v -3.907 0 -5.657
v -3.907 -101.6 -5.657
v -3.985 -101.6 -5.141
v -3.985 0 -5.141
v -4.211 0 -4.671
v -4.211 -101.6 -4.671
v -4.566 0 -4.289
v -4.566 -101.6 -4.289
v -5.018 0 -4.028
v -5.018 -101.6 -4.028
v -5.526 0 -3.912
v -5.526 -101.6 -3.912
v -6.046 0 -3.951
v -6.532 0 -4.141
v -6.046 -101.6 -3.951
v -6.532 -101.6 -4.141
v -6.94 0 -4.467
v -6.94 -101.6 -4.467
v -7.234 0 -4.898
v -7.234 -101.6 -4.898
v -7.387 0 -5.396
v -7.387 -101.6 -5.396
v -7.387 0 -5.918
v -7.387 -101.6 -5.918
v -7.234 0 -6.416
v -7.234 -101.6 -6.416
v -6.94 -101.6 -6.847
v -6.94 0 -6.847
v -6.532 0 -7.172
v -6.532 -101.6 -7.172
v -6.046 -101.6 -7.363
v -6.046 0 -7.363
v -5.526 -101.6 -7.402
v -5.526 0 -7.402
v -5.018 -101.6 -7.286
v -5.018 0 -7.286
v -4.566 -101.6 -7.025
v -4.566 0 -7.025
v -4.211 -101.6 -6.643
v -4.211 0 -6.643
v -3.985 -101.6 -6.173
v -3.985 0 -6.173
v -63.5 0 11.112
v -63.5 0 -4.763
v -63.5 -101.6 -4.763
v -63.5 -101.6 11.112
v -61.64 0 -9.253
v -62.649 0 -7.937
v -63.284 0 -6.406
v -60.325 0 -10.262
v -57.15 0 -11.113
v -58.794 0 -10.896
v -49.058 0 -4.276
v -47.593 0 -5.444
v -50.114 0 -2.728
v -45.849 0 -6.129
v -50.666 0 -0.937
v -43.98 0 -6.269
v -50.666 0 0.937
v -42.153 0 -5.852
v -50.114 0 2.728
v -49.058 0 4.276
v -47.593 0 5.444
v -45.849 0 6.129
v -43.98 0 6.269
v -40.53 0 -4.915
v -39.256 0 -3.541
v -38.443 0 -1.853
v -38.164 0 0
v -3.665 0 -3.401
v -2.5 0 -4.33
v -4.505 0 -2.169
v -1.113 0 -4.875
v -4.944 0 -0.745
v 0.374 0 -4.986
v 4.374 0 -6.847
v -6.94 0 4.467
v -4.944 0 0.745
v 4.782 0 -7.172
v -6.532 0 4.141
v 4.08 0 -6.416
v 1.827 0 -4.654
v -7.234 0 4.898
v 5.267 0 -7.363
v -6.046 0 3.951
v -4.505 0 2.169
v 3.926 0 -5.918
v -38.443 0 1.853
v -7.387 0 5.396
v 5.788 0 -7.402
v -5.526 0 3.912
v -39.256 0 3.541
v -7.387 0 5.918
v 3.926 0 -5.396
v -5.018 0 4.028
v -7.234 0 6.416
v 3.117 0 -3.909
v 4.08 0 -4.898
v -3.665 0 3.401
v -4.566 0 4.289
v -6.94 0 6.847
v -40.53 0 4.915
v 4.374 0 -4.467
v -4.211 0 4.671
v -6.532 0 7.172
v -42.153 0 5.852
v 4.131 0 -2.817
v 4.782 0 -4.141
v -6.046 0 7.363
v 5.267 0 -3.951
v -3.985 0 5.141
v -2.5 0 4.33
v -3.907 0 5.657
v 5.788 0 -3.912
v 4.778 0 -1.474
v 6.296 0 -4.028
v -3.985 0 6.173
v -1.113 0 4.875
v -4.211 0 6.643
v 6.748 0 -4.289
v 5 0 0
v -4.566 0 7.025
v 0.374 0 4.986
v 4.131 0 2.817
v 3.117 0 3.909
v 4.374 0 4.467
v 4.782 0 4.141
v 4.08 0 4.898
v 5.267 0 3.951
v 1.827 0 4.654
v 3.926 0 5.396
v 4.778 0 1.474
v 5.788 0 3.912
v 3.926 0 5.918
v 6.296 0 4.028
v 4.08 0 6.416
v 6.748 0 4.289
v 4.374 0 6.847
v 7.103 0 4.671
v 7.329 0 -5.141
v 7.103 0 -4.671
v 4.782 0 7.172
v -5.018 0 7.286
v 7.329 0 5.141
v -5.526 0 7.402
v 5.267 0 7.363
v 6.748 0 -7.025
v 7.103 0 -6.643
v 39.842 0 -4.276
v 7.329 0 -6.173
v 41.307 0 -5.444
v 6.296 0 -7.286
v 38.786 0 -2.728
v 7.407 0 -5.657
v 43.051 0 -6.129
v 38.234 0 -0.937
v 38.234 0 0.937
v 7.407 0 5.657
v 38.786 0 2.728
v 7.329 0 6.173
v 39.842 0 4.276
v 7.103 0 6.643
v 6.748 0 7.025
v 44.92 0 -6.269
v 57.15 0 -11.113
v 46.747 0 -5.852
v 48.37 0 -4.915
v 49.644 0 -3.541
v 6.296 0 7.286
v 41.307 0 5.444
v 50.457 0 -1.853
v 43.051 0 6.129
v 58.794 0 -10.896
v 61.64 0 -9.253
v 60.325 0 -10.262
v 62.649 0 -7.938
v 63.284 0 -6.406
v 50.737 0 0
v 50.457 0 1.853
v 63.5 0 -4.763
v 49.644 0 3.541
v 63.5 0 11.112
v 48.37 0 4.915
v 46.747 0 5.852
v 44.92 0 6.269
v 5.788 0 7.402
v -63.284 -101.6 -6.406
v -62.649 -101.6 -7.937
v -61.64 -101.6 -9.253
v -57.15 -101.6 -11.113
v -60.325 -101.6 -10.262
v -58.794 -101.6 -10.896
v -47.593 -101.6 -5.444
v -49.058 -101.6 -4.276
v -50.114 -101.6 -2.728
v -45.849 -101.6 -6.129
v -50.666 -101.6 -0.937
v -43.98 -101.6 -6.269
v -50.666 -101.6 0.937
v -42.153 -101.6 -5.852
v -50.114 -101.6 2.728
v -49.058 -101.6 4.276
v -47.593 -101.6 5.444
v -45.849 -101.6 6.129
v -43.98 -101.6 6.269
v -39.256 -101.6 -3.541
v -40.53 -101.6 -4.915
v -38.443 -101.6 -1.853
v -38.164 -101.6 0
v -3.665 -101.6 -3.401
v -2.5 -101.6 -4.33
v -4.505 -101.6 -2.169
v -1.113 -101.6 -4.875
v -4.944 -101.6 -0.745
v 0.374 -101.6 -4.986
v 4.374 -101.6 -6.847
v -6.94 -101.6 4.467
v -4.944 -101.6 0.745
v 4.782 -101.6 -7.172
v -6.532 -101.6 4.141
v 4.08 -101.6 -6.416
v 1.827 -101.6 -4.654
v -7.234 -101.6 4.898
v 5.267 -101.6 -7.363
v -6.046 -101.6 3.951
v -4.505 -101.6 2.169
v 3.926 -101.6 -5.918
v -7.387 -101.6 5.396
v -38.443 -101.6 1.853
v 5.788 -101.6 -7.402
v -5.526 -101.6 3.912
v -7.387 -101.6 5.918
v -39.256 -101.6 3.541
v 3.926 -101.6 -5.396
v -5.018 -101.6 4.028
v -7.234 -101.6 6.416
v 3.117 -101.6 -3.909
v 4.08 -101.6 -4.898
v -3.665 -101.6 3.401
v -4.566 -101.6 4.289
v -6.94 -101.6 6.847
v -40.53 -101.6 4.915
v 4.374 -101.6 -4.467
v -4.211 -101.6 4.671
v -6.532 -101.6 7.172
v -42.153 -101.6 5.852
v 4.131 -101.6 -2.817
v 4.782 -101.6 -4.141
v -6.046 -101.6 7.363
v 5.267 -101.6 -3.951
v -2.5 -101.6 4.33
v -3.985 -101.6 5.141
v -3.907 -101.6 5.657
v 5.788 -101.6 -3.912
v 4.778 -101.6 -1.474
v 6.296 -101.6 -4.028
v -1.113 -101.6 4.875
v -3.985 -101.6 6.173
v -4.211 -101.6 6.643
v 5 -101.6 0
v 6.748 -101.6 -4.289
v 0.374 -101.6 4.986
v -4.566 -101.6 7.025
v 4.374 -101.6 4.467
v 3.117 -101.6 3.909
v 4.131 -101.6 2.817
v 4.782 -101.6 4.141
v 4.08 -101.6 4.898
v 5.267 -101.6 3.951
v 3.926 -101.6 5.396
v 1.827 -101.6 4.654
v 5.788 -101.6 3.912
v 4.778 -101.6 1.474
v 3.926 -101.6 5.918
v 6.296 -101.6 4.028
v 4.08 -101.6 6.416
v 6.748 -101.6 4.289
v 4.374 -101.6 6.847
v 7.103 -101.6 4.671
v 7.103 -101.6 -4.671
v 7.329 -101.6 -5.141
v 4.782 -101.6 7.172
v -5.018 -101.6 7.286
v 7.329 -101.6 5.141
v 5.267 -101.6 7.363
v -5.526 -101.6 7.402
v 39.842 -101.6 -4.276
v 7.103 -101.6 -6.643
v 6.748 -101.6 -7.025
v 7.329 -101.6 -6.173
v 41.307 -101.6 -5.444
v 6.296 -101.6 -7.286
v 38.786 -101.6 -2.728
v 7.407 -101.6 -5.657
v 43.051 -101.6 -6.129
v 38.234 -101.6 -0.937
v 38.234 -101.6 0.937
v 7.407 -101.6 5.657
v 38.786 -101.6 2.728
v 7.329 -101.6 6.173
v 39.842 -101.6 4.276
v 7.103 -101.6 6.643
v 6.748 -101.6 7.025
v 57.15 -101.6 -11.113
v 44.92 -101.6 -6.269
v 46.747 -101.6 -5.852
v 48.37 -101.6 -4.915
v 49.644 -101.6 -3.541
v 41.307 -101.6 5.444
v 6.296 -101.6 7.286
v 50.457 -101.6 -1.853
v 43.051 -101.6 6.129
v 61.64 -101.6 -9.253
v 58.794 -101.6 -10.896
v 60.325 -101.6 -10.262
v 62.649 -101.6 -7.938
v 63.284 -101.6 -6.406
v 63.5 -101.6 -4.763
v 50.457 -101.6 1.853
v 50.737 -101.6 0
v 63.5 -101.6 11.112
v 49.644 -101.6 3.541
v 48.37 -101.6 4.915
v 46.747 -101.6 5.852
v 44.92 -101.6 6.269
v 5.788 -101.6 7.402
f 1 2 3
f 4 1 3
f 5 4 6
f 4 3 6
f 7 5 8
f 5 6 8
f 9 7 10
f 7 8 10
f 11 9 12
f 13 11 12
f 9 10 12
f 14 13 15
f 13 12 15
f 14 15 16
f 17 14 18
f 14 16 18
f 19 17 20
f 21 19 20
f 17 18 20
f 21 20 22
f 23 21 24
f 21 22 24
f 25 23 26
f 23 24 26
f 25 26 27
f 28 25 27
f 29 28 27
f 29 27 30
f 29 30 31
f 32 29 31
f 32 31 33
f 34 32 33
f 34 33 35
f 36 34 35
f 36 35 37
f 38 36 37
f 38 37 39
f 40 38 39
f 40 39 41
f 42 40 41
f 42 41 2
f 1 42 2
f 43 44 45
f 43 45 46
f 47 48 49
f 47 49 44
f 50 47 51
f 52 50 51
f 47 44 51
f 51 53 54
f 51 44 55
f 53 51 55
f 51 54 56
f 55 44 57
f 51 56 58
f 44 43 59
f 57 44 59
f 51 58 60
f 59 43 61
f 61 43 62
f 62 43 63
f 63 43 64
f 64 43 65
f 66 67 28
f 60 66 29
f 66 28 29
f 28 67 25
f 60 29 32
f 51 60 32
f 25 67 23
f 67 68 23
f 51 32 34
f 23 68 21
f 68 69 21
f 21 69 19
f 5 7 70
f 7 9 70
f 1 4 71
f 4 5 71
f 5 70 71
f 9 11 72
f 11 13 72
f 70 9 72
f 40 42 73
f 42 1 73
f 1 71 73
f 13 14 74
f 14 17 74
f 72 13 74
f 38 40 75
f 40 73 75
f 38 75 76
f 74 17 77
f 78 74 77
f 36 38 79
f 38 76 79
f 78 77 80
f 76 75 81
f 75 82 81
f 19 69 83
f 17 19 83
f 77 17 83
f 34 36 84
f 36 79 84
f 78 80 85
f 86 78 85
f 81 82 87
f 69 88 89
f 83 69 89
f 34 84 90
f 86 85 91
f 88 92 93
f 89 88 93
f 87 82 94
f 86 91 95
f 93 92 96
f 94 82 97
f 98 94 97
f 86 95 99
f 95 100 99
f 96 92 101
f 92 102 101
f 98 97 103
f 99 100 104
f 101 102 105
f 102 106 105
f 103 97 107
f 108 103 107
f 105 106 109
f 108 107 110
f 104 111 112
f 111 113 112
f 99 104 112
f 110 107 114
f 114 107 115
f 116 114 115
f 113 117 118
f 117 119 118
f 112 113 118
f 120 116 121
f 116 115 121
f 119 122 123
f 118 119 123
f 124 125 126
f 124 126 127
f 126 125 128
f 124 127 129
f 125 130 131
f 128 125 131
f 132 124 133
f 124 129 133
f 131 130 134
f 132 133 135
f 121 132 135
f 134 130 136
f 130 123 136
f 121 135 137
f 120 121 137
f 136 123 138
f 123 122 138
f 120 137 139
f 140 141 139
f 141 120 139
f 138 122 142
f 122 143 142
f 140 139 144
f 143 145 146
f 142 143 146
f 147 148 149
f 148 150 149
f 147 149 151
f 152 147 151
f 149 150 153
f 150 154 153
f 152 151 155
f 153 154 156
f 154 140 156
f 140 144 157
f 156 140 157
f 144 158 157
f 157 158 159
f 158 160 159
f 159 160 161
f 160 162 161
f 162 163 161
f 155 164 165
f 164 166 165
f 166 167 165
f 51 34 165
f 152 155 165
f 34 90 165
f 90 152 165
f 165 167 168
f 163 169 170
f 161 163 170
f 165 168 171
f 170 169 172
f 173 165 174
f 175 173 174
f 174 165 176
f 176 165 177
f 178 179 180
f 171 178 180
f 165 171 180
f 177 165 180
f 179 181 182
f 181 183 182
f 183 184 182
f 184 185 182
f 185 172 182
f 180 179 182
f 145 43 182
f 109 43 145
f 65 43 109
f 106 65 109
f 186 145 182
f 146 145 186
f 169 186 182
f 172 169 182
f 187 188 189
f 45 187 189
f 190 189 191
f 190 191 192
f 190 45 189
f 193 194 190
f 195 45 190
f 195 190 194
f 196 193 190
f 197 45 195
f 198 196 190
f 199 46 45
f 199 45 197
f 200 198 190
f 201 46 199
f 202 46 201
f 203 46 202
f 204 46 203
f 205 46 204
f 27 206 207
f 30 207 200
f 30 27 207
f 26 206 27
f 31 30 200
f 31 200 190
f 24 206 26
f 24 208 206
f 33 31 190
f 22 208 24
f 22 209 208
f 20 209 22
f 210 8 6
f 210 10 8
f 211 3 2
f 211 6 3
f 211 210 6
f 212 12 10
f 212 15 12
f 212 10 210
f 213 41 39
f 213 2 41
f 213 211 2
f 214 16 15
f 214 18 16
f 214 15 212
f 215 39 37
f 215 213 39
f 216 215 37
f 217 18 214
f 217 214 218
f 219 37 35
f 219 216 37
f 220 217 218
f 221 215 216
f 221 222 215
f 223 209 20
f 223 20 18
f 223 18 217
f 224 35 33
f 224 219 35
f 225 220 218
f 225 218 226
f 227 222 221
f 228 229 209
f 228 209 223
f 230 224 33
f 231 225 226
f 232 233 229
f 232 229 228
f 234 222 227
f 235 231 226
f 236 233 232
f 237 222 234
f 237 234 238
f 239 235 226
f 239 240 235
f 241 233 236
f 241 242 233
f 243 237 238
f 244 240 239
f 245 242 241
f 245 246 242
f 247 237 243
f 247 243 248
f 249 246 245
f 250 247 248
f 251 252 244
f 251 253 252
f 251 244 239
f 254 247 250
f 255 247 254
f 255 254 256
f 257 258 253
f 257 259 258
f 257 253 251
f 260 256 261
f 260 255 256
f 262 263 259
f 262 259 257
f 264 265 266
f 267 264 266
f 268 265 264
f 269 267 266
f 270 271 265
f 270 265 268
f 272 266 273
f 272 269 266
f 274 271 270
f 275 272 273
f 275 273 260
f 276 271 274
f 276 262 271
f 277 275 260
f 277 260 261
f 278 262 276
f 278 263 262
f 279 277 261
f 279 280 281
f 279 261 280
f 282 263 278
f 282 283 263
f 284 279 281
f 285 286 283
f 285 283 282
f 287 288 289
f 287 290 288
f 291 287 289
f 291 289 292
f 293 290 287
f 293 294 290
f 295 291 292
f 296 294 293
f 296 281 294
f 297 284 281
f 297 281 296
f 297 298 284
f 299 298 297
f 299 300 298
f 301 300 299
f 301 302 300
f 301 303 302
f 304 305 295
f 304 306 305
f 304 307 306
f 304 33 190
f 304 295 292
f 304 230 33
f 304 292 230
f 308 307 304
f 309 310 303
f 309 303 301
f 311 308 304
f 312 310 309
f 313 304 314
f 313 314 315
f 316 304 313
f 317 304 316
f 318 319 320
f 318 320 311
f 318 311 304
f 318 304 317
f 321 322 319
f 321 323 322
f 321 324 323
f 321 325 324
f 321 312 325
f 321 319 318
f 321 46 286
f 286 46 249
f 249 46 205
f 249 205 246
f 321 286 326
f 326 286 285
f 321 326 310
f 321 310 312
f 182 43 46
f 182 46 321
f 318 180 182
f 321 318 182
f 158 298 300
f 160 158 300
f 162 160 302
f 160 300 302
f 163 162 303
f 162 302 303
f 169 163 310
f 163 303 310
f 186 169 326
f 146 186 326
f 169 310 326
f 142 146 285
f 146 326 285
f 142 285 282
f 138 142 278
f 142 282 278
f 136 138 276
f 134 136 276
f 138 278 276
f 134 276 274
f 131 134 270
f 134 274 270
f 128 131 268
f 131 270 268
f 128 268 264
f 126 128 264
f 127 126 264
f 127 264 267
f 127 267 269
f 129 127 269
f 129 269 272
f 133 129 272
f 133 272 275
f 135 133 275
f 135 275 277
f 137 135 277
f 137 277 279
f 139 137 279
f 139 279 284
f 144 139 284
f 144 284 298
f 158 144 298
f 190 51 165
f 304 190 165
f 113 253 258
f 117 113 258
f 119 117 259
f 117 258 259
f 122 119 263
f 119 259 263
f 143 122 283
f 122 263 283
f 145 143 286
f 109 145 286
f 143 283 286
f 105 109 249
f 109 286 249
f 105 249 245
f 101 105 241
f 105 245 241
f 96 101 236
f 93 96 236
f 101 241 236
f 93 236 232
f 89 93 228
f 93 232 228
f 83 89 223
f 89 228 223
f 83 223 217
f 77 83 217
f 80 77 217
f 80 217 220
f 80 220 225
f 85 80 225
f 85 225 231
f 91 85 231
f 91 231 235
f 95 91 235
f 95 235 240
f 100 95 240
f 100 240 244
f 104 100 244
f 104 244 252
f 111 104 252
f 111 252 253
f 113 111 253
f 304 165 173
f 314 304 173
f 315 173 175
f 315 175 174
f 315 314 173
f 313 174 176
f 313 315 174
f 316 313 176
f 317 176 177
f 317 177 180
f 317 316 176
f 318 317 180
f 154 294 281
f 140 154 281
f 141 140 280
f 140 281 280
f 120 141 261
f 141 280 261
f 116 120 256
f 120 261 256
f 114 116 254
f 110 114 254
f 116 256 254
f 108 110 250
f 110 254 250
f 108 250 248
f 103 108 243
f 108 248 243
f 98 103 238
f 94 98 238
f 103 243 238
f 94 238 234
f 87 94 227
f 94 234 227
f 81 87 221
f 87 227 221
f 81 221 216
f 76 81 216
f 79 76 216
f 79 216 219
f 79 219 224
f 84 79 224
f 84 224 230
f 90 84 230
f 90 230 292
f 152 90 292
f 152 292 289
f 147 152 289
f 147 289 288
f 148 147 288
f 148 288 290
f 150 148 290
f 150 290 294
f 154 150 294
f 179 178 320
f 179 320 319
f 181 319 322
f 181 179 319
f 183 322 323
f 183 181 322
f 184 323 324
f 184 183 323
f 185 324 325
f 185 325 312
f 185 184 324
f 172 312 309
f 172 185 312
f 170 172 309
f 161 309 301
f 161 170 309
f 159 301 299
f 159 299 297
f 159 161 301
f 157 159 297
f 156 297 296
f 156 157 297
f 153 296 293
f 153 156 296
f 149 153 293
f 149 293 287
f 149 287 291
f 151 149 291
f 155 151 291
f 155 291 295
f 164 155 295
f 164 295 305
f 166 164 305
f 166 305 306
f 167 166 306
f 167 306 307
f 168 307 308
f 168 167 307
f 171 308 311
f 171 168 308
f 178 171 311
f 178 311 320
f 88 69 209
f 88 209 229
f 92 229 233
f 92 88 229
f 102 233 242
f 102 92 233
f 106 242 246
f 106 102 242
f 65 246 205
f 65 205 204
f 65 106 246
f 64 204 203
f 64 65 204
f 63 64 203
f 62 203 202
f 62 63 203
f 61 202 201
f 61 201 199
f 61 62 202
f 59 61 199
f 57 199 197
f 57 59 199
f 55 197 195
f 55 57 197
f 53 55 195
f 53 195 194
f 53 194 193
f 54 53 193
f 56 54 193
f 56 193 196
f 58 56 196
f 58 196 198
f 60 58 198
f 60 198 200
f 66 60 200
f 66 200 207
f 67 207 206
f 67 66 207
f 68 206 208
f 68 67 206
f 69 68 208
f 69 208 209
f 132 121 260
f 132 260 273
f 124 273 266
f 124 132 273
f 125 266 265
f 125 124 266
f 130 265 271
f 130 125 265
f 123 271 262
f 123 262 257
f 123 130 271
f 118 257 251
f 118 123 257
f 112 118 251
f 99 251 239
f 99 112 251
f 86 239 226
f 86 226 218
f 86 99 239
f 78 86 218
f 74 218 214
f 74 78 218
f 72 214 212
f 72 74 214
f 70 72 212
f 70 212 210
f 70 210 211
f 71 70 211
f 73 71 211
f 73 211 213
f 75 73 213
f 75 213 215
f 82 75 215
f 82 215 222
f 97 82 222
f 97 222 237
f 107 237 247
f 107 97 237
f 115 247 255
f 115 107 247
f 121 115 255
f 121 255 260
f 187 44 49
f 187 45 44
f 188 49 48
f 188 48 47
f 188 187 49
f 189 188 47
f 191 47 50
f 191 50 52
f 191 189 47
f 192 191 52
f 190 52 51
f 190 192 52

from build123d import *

# Parameters (mm, degrees)
F0_W     = 127
F0_H     = 22.225
F0_R     = 6.2865
F0_R_2   = 5
F1_DEPTH = 101.6
F2_R     = 6.35
F3_R     = 1.75
F4_DEPTH = 101.601


with BuildPart() as f1:
    # F0 (on Front) → F1 (new body)
    with BuildSketch(Plane.XZ):
        Rectangle(F0_W, F0_H)
        with Locations((-44.45, 0)):
            Circle(F0_R, mode=Mode.SUBTRACT)
        Circle(F0_R_2, mode=Mode.SUBTRACT)
        with Locations((44.45, 0)):
            Circle(F0_R, mode=Mode.SUBTRACT)
    extrude(amount=F1_DEPTH)

    # F2
    f2_edges = [f1.edges().sort_by_distance(p)[0] for p in [
        (-63.5, -50.8, -11.1125),
        (63.5, -50.8, -11.1125),
    ]]
    fillet(f2_edges, radius=F2_R)

    # F3 (on face) → F4 (cut, through all)
    with BuildSketch(Plane.XZ.offset(101.6)):
        with Locations((-5.656854, 5.656854)):
            Circle(F3_R)
        with Locations((5.656854, 5.656854)):
            Circle(F3_R)
        with Locations((5.656854, -5.656854)):
            Circle(F3_R)
        with Locations((-5.656854, -5.656854)):
            Circle(F3_R)
    extrude(amount=-F4_DEPTH, mode=Mode.SUBTRACT)


solid = f1.part
